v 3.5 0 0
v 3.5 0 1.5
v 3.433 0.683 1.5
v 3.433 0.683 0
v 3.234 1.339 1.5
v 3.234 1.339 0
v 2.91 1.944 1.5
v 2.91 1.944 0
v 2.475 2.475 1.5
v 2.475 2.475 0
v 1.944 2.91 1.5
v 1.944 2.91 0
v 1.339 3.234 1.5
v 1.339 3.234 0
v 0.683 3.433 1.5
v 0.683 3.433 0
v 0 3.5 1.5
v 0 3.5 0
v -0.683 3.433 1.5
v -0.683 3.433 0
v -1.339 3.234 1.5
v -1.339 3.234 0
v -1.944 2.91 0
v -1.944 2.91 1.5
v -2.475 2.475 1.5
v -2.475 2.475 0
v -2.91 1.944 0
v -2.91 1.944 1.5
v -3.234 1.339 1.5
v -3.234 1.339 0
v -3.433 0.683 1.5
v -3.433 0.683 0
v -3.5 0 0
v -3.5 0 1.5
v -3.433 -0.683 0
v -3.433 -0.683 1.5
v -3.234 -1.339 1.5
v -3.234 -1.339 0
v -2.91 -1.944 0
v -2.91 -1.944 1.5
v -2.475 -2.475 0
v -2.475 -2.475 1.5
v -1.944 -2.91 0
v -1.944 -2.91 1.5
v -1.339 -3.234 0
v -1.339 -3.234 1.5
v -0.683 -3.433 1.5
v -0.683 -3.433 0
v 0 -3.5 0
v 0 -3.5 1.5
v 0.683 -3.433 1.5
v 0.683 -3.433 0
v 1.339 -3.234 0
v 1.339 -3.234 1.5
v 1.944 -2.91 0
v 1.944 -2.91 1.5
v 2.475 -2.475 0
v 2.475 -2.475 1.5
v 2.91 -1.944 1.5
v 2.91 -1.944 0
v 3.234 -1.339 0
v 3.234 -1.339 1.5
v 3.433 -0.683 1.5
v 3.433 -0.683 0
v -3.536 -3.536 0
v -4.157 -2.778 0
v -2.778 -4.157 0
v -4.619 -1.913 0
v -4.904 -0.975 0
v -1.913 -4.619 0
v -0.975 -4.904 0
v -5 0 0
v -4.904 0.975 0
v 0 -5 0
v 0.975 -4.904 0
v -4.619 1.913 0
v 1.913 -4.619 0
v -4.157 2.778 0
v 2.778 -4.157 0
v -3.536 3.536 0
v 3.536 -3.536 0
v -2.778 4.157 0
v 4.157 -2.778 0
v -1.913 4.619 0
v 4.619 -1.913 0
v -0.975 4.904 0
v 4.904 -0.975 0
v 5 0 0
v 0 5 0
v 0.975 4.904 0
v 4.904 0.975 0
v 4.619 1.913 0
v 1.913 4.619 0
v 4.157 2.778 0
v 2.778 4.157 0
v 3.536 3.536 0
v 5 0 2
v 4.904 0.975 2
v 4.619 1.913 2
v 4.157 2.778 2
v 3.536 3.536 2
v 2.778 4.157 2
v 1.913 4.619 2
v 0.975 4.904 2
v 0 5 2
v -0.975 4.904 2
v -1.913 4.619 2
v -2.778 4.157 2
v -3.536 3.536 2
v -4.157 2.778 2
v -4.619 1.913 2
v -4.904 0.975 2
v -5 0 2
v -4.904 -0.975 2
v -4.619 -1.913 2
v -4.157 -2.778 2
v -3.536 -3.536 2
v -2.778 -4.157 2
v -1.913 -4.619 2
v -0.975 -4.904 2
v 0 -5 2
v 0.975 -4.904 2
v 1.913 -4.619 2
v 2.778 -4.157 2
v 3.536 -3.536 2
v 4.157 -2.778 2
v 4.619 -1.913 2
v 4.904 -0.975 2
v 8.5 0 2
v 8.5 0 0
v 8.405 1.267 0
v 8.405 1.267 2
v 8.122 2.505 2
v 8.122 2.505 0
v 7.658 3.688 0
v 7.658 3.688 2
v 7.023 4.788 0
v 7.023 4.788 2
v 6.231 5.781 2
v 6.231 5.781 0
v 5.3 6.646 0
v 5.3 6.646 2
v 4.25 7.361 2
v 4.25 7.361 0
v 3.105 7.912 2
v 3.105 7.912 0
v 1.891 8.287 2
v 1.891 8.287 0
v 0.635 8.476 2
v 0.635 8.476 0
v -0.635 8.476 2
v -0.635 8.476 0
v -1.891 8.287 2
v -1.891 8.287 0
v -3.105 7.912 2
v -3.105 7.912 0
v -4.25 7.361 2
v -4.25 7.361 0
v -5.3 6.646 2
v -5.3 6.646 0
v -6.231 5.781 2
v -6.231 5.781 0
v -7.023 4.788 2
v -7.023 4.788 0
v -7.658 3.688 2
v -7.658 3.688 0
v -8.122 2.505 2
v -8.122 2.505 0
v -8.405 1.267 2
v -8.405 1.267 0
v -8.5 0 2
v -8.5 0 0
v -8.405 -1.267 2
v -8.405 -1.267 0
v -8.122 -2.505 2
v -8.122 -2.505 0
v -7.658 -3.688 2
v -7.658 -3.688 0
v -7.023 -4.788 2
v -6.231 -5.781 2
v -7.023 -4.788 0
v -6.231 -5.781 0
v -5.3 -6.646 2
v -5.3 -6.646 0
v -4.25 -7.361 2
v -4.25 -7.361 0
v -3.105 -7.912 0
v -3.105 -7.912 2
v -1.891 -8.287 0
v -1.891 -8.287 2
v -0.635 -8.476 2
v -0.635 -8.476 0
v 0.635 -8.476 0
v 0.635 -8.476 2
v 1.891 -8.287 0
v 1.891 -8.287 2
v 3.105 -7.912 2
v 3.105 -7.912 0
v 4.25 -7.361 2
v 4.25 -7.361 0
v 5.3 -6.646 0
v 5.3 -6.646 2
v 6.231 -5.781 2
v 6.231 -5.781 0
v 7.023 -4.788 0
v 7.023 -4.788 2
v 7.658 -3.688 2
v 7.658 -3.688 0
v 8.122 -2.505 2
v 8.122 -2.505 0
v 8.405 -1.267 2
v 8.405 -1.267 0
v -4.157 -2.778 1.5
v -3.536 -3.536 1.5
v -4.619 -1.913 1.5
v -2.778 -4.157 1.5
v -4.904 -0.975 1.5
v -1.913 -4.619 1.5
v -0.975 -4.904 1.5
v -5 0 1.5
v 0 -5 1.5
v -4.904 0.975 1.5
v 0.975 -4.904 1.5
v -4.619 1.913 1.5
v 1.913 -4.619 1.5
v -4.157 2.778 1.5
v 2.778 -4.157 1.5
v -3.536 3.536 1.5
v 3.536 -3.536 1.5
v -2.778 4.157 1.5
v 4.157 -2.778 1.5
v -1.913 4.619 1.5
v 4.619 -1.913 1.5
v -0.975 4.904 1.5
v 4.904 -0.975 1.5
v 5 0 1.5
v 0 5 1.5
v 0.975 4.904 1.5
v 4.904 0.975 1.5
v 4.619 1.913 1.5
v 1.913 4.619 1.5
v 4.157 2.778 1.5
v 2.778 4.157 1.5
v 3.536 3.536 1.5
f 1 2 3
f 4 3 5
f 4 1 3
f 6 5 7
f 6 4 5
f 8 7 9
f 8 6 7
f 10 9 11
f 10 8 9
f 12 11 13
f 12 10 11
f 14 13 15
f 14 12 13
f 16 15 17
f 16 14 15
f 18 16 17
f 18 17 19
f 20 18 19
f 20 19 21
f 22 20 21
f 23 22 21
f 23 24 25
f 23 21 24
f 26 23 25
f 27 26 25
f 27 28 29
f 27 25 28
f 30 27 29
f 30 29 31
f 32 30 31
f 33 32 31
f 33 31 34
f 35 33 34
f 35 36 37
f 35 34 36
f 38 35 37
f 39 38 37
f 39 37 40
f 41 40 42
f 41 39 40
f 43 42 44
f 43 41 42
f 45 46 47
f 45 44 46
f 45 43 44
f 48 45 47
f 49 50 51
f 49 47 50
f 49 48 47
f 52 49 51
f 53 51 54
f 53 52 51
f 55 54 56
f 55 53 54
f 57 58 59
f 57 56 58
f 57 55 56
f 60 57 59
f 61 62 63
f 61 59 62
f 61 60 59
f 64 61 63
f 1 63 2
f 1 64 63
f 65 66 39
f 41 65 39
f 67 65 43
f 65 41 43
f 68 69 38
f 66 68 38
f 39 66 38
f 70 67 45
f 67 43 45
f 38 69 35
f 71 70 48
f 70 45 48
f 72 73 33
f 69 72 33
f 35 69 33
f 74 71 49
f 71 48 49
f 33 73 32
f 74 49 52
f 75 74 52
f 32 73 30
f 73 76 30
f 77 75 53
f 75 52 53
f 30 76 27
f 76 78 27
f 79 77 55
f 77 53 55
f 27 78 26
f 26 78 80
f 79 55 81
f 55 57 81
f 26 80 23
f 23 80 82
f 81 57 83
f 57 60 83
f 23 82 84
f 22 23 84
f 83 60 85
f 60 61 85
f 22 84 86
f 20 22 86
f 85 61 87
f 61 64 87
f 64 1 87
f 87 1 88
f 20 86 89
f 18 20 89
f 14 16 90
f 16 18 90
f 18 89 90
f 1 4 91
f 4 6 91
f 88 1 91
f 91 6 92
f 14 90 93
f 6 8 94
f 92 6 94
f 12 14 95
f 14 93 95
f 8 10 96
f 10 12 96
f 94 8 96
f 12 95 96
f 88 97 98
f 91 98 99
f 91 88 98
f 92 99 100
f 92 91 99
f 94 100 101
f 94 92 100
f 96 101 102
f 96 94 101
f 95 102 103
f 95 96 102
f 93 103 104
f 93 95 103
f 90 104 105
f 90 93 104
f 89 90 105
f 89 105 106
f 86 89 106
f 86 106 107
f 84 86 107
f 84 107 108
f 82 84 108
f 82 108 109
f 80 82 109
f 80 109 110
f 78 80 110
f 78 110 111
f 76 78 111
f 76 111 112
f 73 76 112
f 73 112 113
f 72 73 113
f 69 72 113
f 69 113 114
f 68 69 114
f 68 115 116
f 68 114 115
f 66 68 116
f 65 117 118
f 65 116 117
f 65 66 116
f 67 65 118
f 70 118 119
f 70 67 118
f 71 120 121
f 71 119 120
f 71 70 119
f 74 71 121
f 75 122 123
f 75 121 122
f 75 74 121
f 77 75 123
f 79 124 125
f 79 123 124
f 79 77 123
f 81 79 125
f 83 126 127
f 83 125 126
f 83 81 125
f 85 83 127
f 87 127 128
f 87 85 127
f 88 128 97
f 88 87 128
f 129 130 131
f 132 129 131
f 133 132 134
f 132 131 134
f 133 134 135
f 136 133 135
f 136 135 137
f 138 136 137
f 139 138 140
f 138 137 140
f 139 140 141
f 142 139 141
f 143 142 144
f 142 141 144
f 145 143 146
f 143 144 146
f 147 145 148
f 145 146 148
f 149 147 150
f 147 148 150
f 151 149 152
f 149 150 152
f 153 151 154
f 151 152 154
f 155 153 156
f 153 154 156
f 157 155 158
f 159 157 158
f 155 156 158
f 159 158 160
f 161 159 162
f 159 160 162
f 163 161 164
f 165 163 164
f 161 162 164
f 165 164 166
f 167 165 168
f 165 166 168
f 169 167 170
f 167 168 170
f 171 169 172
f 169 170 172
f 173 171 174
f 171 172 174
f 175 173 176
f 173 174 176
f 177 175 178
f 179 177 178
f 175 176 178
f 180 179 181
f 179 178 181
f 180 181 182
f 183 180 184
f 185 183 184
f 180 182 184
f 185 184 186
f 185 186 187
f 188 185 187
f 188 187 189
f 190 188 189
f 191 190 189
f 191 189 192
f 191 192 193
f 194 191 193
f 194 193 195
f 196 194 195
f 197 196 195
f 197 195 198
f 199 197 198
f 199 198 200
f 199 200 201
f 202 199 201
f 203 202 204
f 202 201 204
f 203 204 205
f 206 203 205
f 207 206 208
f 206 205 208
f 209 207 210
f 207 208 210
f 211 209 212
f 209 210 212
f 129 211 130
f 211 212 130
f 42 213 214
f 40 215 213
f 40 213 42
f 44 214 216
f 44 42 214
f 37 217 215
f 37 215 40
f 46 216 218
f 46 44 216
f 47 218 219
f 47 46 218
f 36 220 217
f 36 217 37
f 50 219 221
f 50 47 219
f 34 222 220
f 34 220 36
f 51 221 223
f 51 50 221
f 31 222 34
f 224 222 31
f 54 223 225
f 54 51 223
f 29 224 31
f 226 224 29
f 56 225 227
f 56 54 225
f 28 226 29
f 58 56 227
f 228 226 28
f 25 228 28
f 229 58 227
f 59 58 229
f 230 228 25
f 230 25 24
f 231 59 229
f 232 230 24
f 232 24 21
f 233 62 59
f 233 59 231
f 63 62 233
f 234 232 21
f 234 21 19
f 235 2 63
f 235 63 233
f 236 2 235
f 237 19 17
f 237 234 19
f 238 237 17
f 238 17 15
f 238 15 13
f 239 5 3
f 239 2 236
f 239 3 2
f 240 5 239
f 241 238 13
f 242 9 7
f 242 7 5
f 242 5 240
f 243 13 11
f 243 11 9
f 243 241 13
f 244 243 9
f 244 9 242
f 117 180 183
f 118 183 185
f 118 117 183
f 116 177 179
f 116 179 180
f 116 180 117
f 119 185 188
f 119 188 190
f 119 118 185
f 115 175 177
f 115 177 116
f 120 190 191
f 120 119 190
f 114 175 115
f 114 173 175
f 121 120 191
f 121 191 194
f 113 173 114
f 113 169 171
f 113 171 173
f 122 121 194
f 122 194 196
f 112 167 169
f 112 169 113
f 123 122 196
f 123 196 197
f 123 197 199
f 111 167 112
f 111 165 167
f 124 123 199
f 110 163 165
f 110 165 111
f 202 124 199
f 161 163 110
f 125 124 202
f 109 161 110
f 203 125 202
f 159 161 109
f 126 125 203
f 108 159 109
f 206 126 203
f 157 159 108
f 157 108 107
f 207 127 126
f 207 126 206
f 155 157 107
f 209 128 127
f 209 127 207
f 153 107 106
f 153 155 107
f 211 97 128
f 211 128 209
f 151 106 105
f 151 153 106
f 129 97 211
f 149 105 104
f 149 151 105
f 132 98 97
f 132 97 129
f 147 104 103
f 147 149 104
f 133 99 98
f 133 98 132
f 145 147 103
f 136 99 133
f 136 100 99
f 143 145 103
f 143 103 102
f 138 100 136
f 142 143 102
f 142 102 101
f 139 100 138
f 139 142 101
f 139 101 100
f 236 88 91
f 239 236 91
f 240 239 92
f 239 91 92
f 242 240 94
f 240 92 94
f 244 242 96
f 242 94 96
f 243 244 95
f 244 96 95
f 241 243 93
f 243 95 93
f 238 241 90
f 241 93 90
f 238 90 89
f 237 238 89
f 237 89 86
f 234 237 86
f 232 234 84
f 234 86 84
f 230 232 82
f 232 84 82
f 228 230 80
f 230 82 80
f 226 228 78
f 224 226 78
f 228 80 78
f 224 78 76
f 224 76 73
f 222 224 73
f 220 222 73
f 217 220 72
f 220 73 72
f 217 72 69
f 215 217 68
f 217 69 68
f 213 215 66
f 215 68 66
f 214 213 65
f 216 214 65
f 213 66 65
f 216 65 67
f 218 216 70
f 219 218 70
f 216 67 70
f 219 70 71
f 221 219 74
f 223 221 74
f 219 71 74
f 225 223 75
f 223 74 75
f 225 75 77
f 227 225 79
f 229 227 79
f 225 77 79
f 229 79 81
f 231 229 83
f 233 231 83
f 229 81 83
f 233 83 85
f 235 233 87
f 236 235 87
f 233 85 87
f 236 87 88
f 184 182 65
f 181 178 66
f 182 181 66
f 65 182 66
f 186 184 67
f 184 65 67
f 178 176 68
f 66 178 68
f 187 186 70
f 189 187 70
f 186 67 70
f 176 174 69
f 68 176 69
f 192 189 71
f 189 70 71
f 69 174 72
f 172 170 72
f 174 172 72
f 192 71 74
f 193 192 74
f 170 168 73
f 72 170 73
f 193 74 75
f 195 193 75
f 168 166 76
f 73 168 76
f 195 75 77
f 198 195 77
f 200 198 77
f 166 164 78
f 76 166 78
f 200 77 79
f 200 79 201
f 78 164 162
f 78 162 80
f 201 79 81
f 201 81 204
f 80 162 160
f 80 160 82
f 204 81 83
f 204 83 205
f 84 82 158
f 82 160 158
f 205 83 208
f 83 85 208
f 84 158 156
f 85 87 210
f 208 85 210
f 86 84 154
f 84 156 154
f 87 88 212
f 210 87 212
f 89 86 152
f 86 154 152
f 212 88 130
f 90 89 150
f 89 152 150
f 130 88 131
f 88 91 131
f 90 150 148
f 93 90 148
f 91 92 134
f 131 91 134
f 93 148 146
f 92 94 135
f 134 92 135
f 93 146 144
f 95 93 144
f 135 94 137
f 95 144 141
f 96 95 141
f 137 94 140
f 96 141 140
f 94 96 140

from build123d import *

# Parameters (mm, degrees)
F0_R     = 8.5
F3_DEPTH = 2
F2_R     = 5
F4_DEPTH = 5
F5_DEPTH = 1.5
F1_R     = 3.5
F6_DEPTH = 25


with BuildPart() as f3:
    # F0 (on Top) → F3 (new body)
    with BuildSketch(Plane.XY):
        Circle(F0_R)
    extrude(amount=F3_DEPTH)

    # F2 (on Top) → F4 (cut)
    with BuildSketch(Plane.XY):
        Circle(F2_R)
    extrude(amount=F4_DEPTH, mode=Mode.SUBTRACT)


with BuildPart() as f5:
    # F2 (on Top) → F5 (new body)
    with BuildSketch(Plane.XY):
        Circle(F2_R)
    extrude(amount=F5_DEPTH)

    # F1 (on Top) → F6 (cut)
    with BuildSketch(Plane.XY):
        Circle(F1_R)
    extrude(amount=F6_DEPTH, mode=Mode.SUBTRACT)


solid = Compound([f3.part, f5.part])
